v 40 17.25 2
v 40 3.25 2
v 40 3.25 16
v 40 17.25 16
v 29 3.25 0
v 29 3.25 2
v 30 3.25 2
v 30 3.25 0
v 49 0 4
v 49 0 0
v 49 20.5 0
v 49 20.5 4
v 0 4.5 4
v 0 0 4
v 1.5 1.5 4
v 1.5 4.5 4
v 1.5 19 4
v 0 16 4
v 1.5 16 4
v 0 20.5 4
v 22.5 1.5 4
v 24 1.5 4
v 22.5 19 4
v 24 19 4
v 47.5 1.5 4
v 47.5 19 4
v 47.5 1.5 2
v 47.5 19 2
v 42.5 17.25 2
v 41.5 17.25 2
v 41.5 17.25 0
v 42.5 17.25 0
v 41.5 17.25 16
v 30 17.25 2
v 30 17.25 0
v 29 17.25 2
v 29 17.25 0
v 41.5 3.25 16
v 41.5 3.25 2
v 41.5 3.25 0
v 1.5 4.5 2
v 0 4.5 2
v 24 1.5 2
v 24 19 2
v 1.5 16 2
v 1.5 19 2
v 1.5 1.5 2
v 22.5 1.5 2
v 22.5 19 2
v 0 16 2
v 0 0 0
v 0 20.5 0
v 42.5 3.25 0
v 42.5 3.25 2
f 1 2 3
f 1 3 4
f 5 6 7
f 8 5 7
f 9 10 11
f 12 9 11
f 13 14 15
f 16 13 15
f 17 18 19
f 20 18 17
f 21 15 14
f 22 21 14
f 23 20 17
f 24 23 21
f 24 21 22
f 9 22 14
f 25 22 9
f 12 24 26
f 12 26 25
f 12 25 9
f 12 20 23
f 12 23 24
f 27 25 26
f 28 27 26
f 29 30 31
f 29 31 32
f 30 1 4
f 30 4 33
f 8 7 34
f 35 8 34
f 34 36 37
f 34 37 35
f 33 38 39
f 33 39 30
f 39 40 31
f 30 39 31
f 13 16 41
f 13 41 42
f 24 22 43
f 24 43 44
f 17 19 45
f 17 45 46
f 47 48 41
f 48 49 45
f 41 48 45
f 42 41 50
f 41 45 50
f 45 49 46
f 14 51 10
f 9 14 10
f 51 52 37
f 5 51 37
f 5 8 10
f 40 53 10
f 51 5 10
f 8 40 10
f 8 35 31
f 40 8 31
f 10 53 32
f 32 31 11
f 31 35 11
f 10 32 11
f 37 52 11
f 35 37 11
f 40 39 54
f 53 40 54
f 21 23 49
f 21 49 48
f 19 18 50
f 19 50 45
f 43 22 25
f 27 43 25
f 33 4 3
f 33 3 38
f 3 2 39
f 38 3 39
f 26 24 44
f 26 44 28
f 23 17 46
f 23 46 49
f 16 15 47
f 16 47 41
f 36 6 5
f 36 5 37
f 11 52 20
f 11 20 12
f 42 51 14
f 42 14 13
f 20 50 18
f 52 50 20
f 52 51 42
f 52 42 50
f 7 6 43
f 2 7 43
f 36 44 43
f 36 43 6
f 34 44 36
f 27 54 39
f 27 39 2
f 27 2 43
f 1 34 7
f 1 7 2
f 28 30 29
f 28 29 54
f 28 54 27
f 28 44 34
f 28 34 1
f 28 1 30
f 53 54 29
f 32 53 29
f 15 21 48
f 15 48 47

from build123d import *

# Parameters (mm, degrees)
SKETCH_W        = 49
SKETCH_H        = 20.5
PAD_DEPTH       = 4
POCKET_DEPTH    = 2
SKETCH002_W     = 23.5
SKETCH002_H     = 17.5
POCKET001_DEPTH = 2
SKETCH004_W     = 1
SKETCH004_H     = 14
POCKET002_DEPTH = 2
SKETCH005_W     = 1.5
SKETCH005_H     = 14
PAD001_DEPTH    = 14


with BuildPart() as part:
    # Sketch → Pad (new body)
    with BuildSketch(Plane.XY):
        with Locations((24.5, 10.25)):
            Rectangle(SKETCH_W, SKETCH_H)
    extrude(amount=PAD_DEPTH)

    # Sketch001 (on Face6 of Pad) → Pocket (cut)
    with BuildSketch(Plane.XY.offset(4)):
        Polygon((1.5, 19), (22.5, 19), (22.5, 1.5), (1.5, 1.5), (1.5, 4.5), (0, 4.5), (0, 16), (1.5, 16), align=None)
    extrude(amount=-POCKET_DEPTH, mode=Mode.SUBTRACT)

    # Sketch002 (on Face5 of Pocket) → Pocket001 (cut)
    with BuildSketch(Plane.XY.offset(4)):
        with Locations((35.75, 10.25)):
            Rectangle(SKETCH002_W, SKETCH002_H)
    extrude(amount=-POCKET001_DEPTH, mode=Mode.SUBTRACT)

    # Sketch004 (on Face19 of Pocket001) → Pocket002 (cut)
    with BuildSketch(Plane.XY.offset(2)):
        with Locations((29.5, 10.25)):
            Rectangle(SKETCH004_W, SKETCH004_H)
        with Locations((42, 10.25)):
            Rectangle(SKETCH004_W, SKETCH004_H)
    extrude(amount=-POCKET002_DEPTH, mode=Mode.SUBTRACT)

    # Sketch005 (on Face27 of Pocket002) → Pad001 (join)
    with BuildSketch(Plane.XY.offset(2)):
        with Locations((40.75, 10.25)):
            Rectangle(SKETCH005_W, SKETCH005_H)
    extrude(amount=PAD001_DEPTH)


solid = part.part
